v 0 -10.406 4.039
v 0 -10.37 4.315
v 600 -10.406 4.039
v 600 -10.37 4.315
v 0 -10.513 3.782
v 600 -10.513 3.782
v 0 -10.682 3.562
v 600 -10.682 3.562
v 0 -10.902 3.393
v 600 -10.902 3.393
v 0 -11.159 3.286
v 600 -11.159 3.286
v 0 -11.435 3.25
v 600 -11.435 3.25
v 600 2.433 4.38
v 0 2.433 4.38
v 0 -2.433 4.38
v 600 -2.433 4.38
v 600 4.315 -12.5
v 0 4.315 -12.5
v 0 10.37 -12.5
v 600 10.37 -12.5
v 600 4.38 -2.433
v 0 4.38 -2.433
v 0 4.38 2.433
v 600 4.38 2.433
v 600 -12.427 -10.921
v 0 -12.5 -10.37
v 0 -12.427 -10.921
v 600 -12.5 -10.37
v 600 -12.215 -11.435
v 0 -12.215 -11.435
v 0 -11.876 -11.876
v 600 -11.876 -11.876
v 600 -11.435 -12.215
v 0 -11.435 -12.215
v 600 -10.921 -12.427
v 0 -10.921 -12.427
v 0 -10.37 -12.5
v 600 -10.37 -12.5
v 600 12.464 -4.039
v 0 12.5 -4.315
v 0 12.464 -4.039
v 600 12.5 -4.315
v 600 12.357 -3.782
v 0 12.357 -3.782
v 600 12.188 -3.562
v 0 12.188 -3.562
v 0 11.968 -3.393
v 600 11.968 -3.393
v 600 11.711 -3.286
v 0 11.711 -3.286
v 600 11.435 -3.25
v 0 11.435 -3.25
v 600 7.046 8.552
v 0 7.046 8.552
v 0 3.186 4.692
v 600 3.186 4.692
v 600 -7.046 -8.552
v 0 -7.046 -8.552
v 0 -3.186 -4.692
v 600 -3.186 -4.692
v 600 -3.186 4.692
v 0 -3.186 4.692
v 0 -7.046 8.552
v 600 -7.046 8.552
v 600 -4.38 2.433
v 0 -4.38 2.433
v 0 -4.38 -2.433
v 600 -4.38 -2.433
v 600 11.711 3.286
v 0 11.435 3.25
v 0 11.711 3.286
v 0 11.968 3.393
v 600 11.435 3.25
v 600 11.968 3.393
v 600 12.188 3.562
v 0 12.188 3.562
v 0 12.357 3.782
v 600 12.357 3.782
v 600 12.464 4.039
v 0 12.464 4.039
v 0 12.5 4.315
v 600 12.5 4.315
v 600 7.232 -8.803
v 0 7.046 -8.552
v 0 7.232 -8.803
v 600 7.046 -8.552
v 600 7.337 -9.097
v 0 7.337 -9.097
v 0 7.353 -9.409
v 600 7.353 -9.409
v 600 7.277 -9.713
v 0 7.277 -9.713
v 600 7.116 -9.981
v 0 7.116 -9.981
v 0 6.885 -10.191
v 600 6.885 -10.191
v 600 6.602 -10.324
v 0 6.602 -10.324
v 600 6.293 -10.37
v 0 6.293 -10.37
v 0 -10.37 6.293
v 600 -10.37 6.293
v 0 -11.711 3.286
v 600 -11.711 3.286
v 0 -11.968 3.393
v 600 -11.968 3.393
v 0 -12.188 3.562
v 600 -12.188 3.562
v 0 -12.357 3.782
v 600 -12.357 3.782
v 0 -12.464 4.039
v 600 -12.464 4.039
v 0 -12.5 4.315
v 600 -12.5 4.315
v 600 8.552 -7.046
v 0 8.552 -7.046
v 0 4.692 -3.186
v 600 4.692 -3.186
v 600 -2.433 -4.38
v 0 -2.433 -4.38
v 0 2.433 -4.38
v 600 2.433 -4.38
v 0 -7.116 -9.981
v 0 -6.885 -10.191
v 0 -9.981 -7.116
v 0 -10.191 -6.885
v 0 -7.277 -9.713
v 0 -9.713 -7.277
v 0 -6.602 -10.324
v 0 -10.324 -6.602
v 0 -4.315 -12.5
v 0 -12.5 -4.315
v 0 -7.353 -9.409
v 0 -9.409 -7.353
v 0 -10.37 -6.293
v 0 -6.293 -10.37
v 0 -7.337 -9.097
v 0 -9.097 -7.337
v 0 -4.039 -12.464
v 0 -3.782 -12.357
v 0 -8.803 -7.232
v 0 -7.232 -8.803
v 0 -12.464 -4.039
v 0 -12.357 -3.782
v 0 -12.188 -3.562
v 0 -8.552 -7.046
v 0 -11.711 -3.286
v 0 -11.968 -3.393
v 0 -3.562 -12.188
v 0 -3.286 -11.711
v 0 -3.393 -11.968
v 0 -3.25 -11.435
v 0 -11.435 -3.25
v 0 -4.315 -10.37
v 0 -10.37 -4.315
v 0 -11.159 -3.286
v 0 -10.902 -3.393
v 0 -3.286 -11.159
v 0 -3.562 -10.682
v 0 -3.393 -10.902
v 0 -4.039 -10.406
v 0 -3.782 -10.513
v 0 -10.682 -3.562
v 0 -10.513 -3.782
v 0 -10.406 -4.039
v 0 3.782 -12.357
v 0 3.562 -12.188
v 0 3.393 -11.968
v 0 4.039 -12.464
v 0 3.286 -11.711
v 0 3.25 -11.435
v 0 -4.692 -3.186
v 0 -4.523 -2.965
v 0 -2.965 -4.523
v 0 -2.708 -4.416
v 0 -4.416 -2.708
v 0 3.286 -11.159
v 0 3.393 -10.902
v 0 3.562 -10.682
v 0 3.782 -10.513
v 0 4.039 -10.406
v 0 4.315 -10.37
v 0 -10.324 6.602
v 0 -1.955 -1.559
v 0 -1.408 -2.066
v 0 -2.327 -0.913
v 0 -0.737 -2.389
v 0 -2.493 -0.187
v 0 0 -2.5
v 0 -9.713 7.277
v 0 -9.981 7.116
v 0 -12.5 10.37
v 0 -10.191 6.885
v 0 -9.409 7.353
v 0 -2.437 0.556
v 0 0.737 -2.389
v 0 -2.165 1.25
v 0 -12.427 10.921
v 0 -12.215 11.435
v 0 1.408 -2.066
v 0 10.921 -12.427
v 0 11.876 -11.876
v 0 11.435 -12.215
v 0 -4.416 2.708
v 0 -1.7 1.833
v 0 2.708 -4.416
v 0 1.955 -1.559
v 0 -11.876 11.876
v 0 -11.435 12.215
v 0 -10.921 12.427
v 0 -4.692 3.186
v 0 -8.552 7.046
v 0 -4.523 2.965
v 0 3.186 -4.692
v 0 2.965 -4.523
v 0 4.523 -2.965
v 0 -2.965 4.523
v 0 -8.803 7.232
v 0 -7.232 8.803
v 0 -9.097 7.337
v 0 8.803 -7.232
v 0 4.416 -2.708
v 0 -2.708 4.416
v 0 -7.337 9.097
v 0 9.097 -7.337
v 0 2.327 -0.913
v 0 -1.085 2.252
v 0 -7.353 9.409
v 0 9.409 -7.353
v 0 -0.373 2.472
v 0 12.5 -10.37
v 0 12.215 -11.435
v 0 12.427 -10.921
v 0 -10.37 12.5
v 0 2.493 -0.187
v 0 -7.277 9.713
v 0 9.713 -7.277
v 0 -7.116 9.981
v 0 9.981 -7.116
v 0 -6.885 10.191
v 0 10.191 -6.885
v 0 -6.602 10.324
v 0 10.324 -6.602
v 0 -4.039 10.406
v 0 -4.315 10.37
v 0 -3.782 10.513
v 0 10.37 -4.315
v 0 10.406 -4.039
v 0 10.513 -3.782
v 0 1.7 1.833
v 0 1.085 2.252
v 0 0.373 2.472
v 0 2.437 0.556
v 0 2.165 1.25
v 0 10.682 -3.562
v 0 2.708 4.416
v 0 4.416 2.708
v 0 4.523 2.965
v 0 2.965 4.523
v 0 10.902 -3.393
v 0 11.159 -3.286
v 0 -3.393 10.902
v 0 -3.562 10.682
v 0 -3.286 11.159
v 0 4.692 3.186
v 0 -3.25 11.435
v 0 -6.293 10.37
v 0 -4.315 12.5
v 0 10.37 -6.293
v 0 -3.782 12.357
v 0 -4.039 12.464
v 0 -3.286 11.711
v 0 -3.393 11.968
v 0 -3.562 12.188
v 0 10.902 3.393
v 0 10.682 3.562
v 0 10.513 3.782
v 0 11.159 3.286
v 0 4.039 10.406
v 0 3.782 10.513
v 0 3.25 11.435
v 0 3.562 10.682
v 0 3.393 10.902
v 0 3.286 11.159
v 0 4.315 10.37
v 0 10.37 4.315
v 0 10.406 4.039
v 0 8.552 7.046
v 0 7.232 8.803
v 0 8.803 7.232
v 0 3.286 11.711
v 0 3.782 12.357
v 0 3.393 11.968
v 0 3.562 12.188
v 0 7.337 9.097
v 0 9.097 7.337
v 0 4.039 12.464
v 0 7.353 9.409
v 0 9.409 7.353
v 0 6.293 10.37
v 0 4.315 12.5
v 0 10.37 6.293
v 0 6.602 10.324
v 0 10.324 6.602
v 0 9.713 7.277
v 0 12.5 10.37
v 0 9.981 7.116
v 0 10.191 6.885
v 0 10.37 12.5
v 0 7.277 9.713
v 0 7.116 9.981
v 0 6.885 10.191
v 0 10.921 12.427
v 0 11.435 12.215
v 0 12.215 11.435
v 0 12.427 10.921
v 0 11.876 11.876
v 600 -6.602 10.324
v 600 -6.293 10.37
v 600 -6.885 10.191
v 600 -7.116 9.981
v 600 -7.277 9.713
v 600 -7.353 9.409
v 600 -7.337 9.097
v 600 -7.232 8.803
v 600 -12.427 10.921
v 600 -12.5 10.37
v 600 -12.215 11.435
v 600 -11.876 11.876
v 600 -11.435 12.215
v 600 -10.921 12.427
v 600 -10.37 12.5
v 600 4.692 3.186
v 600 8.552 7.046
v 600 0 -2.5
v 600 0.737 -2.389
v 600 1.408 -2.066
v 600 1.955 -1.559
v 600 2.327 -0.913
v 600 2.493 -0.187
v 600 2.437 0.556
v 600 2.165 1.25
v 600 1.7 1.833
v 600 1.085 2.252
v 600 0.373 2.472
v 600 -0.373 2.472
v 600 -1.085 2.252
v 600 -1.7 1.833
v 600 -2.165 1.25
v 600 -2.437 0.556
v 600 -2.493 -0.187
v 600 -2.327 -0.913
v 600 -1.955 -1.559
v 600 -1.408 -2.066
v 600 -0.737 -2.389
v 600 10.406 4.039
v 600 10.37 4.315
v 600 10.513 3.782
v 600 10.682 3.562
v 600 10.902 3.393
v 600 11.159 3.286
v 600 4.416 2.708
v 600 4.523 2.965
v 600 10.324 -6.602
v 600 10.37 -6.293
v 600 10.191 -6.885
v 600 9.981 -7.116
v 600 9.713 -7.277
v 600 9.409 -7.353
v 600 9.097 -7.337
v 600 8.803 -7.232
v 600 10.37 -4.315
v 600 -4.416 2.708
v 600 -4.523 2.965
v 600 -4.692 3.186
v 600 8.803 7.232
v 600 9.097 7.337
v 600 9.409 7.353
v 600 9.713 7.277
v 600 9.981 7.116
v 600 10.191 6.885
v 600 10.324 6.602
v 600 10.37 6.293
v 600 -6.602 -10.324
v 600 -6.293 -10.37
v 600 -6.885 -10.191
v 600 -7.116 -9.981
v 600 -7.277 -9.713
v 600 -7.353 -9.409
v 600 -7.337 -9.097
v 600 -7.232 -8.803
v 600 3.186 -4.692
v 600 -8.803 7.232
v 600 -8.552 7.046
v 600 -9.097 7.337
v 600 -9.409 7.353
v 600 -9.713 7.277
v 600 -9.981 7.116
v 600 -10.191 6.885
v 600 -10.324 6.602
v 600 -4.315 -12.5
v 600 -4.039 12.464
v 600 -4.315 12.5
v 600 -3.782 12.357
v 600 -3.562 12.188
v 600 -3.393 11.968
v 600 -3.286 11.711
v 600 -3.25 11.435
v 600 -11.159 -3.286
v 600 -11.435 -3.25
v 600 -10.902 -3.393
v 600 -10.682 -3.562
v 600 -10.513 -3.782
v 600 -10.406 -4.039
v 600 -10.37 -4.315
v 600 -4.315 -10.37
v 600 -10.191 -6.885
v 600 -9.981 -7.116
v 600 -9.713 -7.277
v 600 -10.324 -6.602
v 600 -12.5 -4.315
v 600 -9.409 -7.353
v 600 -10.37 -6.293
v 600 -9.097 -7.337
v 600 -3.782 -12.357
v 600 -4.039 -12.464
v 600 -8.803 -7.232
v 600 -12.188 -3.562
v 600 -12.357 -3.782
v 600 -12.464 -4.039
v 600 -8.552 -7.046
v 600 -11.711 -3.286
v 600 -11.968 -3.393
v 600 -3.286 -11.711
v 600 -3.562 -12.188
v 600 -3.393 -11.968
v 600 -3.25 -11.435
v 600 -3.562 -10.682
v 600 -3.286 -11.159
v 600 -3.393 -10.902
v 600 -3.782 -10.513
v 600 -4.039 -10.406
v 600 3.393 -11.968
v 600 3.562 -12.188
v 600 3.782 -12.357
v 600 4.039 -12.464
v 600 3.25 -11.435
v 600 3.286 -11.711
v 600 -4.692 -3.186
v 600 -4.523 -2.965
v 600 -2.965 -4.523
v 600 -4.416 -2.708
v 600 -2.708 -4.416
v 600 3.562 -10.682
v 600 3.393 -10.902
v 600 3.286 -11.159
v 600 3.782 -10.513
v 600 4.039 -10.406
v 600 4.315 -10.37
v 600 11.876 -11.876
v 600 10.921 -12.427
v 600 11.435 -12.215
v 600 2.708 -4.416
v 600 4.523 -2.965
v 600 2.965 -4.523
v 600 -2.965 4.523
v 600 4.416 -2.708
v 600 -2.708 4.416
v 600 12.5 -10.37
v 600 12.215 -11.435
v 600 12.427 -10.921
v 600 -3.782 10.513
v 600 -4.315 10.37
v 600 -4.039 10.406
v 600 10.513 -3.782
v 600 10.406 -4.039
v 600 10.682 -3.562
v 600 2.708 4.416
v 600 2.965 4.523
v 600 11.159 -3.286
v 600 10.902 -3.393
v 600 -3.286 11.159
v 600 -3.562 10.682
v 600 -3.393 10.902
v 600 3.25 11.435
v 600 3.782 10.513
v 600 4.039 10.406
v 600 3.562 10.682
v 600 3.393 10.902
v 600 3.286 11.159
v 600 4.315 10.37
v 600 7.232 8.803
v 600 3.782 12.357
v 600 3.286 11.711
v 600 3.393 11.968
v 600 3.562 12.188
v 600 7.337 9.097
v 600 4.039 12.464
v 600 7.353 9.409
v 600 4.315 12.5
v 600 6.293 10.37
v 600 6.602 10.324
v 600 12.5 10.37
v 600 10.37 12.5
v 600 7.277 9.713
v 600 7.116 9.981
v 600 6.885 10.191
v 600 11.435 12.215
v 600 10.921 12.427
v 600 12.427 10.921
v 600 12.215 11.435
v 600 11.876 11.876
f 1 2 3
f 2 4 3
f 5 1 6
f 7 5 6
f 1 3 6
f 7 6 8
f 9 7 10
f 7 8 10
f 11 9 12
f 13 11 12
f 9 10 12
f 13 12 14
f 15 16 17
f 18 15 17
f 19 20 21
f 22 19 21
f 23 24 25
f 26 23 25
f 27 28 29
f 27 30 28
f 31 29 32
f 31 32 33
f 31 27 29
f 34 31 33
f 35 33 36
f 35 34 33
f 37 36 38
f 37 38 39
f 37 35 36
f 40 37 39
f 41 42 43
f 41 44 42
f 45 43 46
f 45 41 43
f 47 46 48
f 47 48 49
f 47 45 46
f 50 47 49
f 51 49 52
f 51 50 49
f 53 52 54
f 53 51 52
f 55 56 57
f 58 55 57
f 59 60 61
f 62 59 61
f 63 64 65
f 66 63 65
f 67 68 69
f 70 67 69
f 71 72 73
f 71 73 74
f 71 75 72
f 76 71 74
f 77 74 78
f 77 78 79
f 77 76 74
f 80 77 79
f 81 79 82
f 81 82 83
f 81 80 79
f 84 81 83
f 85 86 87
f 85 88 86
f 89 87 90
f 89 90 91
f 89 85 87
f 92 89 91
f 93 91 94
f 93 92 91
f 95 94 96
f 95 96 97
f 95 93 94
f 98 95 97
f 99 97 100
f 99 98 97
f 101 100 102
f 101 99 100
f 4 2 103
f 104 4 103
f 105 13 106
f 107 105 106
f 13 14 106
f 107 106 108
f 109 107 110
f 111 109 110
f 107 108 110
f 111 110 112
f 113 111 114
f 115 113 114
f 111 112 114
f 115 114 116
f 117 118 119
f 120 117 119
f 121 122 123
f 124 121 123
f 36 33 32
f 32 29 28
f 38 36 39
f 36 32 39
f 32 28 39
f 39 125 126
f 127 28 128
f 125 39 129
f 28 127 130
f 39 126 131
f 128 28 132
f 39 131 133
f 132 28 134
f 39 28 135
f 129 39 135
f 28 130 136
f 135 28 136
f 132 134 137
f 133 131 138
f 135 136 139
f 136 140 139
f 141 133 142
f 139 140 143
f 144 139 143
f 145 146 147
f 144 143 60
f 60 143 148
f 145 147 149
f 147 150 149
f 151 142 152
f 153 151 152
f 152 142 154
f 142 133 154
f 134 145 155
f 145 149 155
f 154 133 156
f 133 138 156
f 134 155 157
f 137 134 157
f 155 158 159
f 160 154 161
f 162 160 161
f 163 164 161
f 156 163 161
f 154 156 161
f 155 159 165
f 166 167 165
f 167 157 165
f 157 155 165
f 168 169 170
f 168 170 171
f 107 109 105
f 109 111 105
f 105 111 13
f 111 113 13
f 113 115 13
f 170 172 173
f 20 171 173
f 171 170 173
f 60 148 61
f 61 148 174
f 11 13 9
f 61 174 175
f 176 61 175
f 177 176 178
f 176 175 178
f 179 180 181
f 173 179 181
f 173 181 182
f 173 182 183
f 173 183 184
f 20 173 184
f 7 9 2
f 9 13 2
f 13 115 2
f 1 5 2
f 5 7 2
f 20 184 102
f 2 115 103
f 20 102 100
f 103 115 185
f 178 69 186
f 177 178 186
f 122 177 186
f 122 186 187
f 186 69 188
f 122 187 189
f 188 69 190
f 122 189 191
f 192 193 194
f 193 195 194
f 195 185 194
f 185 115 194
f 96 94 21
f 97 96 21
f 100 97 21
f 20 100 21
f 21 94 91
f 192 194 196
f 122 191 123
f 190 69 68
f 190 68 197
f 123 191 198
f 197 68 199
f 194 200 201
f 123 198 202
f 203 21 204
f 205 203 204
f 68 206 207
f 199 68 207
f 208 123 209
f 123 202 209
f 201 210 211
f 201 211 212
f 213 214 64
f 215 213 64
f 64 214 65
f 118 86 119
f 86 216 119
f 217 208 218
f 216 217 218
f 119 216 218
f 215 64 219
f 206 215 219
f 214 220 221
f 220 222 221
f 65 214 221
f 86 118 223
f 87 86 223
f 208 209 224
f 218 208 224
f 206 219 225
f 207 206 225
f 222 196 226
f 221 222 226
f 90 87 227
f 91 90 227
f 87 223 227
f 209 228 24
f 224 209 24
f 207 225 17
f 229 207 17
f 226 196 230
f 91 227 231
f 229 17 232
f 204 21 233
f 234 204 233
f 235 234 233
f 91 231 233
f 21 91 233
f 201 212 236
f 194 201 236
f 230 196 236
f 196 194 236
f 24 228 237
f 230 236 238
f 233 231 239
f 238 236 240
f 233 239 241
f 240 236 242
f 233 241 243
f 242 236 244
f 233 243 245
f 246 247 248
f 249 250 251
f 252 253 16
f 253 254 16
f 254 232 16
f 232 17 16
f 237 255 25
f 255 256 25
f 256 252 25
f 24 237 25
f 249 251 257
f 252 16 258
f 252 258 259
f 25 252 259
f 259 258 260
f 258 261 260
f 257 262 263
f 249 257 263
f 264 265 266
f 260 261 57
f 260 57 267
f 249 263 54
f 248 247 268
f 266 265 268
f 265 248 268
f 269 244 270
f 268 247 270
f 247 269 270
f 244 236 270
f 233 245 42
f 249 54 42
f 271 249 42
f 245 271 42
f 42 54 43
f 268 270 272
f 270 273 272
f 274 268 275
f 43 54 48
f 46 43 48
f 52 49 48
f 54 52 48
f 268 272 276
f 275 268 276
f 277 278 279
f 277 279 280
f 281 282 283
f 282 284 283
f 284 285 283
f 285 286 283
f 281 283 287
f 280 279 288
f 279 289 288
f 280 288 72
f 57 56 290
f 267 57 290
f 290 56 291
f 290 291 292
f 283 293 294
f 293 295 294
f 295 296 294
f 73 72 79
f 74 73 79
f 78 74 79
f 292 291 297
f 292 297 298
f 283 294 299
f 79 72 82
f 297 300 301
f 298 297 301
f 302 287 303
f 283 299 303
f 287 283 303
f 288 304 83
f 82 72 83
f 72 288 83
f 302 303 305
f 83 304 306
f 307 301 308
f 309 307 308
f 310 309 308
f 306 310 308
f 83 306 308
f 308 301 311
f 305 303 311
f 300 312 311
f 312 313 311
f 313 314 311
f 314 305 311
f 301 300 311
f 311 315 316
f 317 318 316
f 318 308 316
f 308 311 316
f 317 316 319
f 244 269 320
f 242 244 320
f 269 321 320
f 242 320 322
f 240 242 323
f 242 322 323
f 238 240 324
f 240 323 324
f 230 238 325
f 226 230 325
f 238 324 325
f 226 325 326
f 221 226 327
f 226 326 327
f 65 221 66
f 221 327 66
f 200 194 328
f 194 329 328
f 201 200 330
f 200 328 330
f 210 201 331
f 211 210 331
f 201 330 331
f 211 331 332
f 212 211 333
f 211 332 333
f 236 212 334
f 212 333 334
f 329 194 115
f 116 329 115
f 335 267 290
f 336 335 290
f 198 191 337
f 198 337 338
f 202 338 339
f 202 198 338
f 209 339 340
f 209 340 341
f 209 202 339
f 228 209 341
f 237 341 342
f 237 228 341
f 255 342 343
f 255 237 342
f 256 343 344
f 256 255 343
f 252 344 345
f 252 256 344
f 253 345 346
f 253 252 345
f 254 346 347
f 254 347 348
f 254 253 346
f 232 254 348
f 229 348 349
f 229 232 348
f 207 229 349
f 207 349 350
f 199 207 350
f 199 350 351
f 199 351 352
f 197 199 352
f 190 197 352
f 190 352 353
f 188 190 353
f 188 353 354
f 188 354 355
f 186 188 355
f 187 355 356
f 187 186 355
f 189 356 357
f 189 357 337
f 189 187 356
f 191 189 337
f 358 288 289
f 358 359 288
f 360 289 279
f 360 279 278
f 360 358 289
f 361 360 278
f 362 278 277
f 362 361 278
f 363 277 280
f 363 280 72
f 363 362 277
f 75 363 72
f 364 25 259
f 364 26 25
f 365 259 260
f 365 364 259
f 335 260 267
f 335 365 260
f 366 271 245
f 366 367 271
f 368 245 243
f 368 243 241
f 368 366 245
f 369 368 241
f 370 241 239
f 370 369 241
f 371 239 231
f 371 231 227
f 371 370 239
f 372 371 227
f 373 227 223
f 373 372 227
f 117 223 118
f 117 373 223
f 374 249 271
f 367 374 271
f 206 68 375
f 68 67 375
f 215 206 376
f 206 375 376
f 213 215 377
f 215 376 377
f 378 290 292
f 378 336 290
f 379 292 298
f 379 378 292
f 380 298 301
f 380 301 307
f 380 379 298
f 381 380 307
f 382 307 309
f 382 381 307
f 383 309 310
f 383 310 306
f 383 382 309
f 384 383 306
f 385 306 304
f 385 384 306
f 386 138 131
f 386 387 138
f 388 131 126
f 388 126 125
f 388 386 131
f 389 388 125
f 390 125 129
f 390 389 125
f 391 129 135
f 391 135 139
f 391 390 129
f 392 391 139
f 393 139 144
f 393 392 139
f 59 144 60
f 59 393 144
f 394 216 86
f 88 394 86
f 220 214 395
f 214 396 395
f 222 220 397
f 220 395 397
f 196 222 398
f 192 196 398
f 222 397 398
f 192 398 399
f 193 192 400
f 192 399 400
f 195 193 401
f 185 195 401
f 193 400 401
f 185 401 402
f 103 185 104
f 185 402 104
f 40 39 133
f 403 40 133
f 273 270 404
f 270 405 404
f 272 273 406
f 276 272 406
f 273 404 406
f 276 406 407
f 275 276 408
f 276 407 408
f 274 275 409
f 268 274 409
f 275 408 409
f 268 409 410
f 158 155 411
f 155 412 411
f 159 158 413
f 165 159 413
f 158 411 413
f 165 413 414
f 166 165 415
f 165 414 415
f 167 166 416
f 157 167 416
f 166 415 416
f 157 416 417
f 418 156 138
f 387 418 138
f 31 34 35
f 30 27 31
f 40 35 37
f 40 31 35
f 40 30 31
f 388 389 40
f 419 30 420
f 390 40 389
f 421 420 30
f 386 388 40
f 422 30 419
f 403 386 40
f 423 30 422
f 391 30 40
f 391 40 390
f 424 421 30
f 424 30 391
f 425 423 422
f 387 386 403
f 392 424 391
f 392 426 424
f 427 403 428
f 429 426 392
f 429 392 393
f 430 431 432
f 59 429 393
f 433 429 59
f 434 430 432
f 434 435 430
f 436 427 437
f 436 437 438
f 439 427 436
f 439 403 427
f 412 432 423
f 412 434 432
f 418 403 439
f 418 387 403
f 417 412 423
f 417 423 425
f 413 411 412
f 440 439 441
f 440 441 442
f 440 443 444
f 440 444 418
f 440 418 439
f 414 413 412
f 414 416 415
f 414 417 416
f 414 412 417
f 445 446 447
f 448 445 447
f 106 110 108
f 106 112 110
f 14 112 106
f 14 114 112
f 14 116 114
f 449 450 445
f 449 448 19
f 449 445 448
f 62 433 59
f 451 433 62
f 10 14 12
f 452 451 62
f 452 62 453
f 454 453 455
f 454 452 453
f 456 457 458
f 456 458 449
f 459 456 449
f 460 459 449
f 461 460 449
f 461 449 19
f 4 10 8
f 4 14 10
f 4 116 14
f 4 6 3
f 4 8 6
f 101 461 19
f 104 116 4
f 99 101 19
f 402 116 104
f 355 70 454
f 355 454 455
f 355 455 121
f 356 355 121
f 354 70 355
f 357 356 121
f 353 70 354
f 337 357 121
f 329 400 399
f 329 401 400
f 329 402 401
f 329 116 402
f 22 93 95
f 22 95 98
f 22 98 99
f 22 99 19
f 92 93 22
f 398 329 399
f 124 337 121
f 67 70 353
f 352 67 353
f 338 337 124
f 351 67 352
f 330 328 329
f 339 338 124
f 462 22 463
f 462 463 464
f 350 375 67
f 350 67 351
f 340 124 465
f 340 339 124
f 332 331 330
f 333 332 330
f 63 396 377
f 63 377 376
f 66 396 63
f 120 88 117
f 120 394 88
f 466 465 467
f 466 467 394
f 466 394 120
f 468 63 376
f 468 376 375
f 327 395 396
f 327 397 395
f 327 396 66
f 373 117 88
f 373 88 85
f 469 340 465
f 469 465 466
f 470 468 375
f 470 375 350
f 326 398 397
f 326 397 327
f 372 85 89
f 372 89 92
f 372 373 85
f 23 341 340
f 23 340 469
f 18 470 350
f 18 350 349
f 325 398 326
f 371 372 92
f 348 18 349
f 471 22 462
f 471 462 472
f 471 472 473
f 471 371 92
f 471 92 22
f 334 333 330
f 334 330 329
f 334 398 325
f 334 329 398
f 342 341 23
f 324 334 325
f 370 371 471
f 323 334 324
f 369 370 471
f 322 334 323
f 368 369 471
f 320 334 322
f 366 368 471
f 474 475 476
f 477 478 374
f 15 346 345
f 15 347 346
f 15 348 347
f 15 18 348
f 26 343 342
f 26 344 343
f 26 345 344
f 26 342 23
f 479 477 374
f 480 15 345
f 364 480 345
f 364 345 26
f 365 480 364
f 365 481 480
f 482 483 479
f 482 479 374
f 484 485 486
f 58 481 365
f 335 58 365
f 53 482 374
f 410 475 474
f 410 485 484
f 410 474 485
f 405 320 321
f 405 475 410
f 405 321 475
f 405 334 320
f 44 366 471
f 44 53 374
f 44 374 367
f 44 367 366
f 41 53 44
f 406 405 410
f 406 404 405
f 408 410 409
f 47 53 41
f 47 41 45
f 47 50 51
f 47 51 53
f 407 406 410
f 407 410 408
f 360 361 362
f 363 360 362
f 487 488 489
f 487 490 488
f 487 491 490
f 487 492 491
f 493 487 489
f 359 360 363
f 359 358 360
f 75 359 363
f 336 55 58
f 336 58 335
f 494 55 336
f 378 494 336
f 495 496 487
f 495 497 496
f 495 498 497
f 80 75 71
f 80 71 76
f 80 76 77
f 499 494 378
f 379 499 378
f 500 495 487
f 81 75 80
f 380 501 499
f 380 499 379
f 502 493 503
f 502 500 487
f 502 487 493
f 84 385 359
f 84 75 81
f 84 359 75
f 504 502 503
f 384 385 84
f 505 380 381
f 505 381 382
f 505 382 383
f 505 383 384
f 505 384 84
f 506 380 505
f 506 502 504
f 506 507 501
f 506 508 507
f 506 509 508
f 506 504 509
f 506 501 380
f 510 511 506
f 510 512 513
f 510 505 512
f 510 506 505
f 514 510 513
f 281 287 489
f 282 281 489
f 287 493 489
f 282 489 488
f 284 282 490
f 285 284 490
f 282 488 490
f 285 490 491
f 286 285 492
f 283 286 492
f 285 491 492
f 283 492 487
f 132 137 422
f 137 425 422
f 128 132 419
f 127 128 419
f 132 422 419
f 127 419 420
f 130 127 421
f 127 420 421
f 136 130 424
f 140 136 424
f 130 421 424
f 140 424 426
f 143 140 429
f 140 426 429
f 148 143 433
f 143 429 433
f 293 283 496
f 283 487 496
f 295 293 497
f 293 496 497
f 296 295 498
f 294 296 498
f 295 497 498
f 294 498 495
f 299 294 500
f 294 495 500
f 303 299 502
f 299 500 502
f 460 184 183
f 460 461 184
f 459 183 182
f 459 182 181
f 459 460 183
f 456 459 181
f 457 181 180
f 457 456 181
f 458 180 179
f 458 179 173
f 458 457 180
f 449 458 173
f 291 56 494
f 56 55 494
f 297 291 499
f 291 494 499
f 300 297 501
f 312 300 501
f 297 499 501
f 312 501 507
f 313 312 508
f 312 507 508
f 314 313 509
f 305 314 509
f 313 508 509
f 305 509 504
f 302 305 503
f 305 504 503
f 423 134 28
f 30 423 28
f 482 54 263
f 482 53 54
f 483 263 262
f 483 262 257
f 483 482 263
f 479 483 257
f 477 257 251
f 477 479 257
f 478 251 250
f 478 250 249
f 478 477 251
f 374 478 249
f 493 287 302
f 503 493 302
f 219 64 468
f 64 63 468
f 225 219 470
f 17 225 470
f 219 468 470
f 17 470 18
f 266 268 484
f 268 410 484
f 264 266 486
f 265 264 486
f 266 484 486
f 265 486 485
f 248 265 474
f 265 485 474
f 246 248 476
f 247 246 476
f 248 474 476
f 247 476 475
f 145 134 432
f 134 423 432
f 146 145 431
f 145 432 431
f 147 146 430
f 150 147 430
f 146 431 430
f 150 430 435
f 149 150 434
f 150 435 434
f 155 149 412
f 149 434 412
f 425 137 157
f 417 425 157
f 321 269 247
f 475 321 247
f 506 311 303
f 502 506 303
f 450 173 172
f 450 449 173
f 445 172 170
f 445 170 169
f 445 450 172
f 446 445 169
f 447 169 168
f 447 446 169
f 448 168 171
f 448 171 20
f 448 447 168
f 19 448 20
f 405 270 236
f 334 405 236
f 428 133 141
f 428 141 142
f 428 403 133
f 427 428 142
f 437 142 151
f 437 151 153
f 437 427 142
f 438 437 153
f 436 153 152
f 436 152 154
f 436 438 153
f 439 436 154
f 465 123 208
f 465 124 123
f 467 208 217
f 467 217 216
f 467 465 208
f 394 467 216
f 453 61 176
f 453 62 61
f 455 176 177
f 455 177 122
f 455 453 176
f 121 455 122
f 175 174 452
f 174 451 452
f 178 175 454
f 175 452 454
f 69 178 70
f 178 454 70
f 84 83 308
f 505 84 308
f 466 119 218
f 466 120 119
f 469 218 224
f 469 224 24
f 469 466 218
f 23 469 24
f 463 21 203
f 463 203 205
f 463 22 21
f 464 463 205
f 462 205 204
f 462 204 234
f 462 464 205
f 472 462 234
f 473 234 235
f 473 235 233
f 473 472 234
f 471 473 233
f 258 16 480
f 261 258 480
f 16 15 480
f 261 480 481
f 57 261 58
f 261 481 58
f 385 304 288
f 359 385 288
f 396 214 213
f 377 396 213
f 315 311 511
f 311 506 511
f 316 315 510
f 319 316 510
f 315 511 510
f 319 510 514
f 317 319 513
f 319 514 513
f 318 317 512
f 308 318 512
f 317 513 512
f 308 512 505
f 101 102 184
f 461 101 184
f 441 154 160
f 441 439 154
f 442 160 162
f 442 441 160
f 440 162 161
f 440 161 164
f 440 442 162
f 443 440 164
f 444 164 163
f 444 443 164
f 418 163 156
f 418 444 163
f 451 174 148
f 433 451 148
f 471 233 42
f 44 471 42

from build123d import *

# Parameters (mm, degrees)
SKETCH1_R           = 2.5
BOSS_EXTRUDE1_DEPTH = 600
FILLET1_R           = 1.065
FILLET2_R           = 2.13


with BuildPart() as part:
    # Sketch1 → Boss-Extrude1 (new body)
    with BuildSketch(Plane.YZ):
        Polygon((-12.5, -3.25), (-12.5, -12.5), (-3.25, -12.5), (-3.25, -10.37), (-8.863862556, -10.37), (-2.873862556, -4.38), (2.873862556, -4.38), (8.863862556, -10.37), (3.25, -10.37), (3.25, -12.5), (12.5, -12.5), (12.5, -3.25), (10.37, -3.25), (10.37, -8.863862556), (4.38, -2.873862556), (4.38, 2.873862556), (10.37, 8.863862556), (10.37, 3.25), (12.5, 3.25), (12.5, 12.5), (3.25, 12.5), (3.25, 10.37), (8.863862556, 10.37), (2.873862556, 4.38), (-2.873862556, 4.38), (-8.863862556, 10.37), (-3.25, 10.37), (-3.25, 12.5), (-12.5, 12.5), (-12.5, 3.25), (-10.37, 3.25), (-10.37, 8.863862556), (-4.38, 2.873862556), (-4.38, -2.873862556), (-10.37, -8.863862556), (-10.37, -3.25), align=None)
        with Locations(Location((0, 0, 0), (0, 0, 270))):
            Circle(SKETCH1_R, mode=Mode.SUBTRACT)
    extrude(amount=BOSS_EXTRUDE1_DEPTH)

    # Fillet1
    fillet1_edges = [part.edges().sort_by_distance(p)[0] for p in [
        (300, -10.37, -8.863862556),
        (300, 2.873862556, -4.38),
        (300, -2.873862556, -4.38),
        (300, -4.38, 2.873862556),
        (300, -4.38, -2.873862556),
        (300, -2.873862556, 4.38),
        (300, 2.873862556, 4.38),
        (300, 4.38, 2.873862556),
        (300, 4.38, -2.873862556),
        (300, -8.863862556, -10.37),
        (300, 8.863862556, -10.37),
        (300, 10.37, -8.863862556),
        (300, -10.37, 8.863862556),
        (300, -8.863862556, 10.37),
        (300, 10.37, 8.863862556),
        (300, 8.863862556, 10.37),
        (300, 12.5, 3.25),
        (300, -3.25, -12.5),
        (300, -10.37, 3.25),
        (300, 10.37, 3.25),
        (300, -10.37, -3.25),
        (300, -12.5, -3.25),
        (300, -12.5, 3.25),
        (300, 3.25, -10.37),
        (300, -3.25, -10.37),
        (300, 3.25, -12.5),
        (300, 10.37, -3.25),
        (300, 12.5, -3.25),
        (300, 3.25, 12.5),
        (300, 3.25, 10.37),
        (300, -3.25, 10.37),
        (300, -3.25, 12.5),
    ]]
    fillet(fillet1_edges, radius=FILLET1_R - 0.0001)  # a hair under: the kernel refuses the full size

    # Fillet2
    fillet2_edges = [part.edges().sort_by_distance(p)[0] for p in [
        (300, -12.5, 12.5),
        (300, 12.5, 12.5),
        (300, 12.5, -12.5),
        (300, -12.5, -12.5),
    ]]
    fillet(fillet2_edges, radius=FILLET2_R)


solid = part.part
